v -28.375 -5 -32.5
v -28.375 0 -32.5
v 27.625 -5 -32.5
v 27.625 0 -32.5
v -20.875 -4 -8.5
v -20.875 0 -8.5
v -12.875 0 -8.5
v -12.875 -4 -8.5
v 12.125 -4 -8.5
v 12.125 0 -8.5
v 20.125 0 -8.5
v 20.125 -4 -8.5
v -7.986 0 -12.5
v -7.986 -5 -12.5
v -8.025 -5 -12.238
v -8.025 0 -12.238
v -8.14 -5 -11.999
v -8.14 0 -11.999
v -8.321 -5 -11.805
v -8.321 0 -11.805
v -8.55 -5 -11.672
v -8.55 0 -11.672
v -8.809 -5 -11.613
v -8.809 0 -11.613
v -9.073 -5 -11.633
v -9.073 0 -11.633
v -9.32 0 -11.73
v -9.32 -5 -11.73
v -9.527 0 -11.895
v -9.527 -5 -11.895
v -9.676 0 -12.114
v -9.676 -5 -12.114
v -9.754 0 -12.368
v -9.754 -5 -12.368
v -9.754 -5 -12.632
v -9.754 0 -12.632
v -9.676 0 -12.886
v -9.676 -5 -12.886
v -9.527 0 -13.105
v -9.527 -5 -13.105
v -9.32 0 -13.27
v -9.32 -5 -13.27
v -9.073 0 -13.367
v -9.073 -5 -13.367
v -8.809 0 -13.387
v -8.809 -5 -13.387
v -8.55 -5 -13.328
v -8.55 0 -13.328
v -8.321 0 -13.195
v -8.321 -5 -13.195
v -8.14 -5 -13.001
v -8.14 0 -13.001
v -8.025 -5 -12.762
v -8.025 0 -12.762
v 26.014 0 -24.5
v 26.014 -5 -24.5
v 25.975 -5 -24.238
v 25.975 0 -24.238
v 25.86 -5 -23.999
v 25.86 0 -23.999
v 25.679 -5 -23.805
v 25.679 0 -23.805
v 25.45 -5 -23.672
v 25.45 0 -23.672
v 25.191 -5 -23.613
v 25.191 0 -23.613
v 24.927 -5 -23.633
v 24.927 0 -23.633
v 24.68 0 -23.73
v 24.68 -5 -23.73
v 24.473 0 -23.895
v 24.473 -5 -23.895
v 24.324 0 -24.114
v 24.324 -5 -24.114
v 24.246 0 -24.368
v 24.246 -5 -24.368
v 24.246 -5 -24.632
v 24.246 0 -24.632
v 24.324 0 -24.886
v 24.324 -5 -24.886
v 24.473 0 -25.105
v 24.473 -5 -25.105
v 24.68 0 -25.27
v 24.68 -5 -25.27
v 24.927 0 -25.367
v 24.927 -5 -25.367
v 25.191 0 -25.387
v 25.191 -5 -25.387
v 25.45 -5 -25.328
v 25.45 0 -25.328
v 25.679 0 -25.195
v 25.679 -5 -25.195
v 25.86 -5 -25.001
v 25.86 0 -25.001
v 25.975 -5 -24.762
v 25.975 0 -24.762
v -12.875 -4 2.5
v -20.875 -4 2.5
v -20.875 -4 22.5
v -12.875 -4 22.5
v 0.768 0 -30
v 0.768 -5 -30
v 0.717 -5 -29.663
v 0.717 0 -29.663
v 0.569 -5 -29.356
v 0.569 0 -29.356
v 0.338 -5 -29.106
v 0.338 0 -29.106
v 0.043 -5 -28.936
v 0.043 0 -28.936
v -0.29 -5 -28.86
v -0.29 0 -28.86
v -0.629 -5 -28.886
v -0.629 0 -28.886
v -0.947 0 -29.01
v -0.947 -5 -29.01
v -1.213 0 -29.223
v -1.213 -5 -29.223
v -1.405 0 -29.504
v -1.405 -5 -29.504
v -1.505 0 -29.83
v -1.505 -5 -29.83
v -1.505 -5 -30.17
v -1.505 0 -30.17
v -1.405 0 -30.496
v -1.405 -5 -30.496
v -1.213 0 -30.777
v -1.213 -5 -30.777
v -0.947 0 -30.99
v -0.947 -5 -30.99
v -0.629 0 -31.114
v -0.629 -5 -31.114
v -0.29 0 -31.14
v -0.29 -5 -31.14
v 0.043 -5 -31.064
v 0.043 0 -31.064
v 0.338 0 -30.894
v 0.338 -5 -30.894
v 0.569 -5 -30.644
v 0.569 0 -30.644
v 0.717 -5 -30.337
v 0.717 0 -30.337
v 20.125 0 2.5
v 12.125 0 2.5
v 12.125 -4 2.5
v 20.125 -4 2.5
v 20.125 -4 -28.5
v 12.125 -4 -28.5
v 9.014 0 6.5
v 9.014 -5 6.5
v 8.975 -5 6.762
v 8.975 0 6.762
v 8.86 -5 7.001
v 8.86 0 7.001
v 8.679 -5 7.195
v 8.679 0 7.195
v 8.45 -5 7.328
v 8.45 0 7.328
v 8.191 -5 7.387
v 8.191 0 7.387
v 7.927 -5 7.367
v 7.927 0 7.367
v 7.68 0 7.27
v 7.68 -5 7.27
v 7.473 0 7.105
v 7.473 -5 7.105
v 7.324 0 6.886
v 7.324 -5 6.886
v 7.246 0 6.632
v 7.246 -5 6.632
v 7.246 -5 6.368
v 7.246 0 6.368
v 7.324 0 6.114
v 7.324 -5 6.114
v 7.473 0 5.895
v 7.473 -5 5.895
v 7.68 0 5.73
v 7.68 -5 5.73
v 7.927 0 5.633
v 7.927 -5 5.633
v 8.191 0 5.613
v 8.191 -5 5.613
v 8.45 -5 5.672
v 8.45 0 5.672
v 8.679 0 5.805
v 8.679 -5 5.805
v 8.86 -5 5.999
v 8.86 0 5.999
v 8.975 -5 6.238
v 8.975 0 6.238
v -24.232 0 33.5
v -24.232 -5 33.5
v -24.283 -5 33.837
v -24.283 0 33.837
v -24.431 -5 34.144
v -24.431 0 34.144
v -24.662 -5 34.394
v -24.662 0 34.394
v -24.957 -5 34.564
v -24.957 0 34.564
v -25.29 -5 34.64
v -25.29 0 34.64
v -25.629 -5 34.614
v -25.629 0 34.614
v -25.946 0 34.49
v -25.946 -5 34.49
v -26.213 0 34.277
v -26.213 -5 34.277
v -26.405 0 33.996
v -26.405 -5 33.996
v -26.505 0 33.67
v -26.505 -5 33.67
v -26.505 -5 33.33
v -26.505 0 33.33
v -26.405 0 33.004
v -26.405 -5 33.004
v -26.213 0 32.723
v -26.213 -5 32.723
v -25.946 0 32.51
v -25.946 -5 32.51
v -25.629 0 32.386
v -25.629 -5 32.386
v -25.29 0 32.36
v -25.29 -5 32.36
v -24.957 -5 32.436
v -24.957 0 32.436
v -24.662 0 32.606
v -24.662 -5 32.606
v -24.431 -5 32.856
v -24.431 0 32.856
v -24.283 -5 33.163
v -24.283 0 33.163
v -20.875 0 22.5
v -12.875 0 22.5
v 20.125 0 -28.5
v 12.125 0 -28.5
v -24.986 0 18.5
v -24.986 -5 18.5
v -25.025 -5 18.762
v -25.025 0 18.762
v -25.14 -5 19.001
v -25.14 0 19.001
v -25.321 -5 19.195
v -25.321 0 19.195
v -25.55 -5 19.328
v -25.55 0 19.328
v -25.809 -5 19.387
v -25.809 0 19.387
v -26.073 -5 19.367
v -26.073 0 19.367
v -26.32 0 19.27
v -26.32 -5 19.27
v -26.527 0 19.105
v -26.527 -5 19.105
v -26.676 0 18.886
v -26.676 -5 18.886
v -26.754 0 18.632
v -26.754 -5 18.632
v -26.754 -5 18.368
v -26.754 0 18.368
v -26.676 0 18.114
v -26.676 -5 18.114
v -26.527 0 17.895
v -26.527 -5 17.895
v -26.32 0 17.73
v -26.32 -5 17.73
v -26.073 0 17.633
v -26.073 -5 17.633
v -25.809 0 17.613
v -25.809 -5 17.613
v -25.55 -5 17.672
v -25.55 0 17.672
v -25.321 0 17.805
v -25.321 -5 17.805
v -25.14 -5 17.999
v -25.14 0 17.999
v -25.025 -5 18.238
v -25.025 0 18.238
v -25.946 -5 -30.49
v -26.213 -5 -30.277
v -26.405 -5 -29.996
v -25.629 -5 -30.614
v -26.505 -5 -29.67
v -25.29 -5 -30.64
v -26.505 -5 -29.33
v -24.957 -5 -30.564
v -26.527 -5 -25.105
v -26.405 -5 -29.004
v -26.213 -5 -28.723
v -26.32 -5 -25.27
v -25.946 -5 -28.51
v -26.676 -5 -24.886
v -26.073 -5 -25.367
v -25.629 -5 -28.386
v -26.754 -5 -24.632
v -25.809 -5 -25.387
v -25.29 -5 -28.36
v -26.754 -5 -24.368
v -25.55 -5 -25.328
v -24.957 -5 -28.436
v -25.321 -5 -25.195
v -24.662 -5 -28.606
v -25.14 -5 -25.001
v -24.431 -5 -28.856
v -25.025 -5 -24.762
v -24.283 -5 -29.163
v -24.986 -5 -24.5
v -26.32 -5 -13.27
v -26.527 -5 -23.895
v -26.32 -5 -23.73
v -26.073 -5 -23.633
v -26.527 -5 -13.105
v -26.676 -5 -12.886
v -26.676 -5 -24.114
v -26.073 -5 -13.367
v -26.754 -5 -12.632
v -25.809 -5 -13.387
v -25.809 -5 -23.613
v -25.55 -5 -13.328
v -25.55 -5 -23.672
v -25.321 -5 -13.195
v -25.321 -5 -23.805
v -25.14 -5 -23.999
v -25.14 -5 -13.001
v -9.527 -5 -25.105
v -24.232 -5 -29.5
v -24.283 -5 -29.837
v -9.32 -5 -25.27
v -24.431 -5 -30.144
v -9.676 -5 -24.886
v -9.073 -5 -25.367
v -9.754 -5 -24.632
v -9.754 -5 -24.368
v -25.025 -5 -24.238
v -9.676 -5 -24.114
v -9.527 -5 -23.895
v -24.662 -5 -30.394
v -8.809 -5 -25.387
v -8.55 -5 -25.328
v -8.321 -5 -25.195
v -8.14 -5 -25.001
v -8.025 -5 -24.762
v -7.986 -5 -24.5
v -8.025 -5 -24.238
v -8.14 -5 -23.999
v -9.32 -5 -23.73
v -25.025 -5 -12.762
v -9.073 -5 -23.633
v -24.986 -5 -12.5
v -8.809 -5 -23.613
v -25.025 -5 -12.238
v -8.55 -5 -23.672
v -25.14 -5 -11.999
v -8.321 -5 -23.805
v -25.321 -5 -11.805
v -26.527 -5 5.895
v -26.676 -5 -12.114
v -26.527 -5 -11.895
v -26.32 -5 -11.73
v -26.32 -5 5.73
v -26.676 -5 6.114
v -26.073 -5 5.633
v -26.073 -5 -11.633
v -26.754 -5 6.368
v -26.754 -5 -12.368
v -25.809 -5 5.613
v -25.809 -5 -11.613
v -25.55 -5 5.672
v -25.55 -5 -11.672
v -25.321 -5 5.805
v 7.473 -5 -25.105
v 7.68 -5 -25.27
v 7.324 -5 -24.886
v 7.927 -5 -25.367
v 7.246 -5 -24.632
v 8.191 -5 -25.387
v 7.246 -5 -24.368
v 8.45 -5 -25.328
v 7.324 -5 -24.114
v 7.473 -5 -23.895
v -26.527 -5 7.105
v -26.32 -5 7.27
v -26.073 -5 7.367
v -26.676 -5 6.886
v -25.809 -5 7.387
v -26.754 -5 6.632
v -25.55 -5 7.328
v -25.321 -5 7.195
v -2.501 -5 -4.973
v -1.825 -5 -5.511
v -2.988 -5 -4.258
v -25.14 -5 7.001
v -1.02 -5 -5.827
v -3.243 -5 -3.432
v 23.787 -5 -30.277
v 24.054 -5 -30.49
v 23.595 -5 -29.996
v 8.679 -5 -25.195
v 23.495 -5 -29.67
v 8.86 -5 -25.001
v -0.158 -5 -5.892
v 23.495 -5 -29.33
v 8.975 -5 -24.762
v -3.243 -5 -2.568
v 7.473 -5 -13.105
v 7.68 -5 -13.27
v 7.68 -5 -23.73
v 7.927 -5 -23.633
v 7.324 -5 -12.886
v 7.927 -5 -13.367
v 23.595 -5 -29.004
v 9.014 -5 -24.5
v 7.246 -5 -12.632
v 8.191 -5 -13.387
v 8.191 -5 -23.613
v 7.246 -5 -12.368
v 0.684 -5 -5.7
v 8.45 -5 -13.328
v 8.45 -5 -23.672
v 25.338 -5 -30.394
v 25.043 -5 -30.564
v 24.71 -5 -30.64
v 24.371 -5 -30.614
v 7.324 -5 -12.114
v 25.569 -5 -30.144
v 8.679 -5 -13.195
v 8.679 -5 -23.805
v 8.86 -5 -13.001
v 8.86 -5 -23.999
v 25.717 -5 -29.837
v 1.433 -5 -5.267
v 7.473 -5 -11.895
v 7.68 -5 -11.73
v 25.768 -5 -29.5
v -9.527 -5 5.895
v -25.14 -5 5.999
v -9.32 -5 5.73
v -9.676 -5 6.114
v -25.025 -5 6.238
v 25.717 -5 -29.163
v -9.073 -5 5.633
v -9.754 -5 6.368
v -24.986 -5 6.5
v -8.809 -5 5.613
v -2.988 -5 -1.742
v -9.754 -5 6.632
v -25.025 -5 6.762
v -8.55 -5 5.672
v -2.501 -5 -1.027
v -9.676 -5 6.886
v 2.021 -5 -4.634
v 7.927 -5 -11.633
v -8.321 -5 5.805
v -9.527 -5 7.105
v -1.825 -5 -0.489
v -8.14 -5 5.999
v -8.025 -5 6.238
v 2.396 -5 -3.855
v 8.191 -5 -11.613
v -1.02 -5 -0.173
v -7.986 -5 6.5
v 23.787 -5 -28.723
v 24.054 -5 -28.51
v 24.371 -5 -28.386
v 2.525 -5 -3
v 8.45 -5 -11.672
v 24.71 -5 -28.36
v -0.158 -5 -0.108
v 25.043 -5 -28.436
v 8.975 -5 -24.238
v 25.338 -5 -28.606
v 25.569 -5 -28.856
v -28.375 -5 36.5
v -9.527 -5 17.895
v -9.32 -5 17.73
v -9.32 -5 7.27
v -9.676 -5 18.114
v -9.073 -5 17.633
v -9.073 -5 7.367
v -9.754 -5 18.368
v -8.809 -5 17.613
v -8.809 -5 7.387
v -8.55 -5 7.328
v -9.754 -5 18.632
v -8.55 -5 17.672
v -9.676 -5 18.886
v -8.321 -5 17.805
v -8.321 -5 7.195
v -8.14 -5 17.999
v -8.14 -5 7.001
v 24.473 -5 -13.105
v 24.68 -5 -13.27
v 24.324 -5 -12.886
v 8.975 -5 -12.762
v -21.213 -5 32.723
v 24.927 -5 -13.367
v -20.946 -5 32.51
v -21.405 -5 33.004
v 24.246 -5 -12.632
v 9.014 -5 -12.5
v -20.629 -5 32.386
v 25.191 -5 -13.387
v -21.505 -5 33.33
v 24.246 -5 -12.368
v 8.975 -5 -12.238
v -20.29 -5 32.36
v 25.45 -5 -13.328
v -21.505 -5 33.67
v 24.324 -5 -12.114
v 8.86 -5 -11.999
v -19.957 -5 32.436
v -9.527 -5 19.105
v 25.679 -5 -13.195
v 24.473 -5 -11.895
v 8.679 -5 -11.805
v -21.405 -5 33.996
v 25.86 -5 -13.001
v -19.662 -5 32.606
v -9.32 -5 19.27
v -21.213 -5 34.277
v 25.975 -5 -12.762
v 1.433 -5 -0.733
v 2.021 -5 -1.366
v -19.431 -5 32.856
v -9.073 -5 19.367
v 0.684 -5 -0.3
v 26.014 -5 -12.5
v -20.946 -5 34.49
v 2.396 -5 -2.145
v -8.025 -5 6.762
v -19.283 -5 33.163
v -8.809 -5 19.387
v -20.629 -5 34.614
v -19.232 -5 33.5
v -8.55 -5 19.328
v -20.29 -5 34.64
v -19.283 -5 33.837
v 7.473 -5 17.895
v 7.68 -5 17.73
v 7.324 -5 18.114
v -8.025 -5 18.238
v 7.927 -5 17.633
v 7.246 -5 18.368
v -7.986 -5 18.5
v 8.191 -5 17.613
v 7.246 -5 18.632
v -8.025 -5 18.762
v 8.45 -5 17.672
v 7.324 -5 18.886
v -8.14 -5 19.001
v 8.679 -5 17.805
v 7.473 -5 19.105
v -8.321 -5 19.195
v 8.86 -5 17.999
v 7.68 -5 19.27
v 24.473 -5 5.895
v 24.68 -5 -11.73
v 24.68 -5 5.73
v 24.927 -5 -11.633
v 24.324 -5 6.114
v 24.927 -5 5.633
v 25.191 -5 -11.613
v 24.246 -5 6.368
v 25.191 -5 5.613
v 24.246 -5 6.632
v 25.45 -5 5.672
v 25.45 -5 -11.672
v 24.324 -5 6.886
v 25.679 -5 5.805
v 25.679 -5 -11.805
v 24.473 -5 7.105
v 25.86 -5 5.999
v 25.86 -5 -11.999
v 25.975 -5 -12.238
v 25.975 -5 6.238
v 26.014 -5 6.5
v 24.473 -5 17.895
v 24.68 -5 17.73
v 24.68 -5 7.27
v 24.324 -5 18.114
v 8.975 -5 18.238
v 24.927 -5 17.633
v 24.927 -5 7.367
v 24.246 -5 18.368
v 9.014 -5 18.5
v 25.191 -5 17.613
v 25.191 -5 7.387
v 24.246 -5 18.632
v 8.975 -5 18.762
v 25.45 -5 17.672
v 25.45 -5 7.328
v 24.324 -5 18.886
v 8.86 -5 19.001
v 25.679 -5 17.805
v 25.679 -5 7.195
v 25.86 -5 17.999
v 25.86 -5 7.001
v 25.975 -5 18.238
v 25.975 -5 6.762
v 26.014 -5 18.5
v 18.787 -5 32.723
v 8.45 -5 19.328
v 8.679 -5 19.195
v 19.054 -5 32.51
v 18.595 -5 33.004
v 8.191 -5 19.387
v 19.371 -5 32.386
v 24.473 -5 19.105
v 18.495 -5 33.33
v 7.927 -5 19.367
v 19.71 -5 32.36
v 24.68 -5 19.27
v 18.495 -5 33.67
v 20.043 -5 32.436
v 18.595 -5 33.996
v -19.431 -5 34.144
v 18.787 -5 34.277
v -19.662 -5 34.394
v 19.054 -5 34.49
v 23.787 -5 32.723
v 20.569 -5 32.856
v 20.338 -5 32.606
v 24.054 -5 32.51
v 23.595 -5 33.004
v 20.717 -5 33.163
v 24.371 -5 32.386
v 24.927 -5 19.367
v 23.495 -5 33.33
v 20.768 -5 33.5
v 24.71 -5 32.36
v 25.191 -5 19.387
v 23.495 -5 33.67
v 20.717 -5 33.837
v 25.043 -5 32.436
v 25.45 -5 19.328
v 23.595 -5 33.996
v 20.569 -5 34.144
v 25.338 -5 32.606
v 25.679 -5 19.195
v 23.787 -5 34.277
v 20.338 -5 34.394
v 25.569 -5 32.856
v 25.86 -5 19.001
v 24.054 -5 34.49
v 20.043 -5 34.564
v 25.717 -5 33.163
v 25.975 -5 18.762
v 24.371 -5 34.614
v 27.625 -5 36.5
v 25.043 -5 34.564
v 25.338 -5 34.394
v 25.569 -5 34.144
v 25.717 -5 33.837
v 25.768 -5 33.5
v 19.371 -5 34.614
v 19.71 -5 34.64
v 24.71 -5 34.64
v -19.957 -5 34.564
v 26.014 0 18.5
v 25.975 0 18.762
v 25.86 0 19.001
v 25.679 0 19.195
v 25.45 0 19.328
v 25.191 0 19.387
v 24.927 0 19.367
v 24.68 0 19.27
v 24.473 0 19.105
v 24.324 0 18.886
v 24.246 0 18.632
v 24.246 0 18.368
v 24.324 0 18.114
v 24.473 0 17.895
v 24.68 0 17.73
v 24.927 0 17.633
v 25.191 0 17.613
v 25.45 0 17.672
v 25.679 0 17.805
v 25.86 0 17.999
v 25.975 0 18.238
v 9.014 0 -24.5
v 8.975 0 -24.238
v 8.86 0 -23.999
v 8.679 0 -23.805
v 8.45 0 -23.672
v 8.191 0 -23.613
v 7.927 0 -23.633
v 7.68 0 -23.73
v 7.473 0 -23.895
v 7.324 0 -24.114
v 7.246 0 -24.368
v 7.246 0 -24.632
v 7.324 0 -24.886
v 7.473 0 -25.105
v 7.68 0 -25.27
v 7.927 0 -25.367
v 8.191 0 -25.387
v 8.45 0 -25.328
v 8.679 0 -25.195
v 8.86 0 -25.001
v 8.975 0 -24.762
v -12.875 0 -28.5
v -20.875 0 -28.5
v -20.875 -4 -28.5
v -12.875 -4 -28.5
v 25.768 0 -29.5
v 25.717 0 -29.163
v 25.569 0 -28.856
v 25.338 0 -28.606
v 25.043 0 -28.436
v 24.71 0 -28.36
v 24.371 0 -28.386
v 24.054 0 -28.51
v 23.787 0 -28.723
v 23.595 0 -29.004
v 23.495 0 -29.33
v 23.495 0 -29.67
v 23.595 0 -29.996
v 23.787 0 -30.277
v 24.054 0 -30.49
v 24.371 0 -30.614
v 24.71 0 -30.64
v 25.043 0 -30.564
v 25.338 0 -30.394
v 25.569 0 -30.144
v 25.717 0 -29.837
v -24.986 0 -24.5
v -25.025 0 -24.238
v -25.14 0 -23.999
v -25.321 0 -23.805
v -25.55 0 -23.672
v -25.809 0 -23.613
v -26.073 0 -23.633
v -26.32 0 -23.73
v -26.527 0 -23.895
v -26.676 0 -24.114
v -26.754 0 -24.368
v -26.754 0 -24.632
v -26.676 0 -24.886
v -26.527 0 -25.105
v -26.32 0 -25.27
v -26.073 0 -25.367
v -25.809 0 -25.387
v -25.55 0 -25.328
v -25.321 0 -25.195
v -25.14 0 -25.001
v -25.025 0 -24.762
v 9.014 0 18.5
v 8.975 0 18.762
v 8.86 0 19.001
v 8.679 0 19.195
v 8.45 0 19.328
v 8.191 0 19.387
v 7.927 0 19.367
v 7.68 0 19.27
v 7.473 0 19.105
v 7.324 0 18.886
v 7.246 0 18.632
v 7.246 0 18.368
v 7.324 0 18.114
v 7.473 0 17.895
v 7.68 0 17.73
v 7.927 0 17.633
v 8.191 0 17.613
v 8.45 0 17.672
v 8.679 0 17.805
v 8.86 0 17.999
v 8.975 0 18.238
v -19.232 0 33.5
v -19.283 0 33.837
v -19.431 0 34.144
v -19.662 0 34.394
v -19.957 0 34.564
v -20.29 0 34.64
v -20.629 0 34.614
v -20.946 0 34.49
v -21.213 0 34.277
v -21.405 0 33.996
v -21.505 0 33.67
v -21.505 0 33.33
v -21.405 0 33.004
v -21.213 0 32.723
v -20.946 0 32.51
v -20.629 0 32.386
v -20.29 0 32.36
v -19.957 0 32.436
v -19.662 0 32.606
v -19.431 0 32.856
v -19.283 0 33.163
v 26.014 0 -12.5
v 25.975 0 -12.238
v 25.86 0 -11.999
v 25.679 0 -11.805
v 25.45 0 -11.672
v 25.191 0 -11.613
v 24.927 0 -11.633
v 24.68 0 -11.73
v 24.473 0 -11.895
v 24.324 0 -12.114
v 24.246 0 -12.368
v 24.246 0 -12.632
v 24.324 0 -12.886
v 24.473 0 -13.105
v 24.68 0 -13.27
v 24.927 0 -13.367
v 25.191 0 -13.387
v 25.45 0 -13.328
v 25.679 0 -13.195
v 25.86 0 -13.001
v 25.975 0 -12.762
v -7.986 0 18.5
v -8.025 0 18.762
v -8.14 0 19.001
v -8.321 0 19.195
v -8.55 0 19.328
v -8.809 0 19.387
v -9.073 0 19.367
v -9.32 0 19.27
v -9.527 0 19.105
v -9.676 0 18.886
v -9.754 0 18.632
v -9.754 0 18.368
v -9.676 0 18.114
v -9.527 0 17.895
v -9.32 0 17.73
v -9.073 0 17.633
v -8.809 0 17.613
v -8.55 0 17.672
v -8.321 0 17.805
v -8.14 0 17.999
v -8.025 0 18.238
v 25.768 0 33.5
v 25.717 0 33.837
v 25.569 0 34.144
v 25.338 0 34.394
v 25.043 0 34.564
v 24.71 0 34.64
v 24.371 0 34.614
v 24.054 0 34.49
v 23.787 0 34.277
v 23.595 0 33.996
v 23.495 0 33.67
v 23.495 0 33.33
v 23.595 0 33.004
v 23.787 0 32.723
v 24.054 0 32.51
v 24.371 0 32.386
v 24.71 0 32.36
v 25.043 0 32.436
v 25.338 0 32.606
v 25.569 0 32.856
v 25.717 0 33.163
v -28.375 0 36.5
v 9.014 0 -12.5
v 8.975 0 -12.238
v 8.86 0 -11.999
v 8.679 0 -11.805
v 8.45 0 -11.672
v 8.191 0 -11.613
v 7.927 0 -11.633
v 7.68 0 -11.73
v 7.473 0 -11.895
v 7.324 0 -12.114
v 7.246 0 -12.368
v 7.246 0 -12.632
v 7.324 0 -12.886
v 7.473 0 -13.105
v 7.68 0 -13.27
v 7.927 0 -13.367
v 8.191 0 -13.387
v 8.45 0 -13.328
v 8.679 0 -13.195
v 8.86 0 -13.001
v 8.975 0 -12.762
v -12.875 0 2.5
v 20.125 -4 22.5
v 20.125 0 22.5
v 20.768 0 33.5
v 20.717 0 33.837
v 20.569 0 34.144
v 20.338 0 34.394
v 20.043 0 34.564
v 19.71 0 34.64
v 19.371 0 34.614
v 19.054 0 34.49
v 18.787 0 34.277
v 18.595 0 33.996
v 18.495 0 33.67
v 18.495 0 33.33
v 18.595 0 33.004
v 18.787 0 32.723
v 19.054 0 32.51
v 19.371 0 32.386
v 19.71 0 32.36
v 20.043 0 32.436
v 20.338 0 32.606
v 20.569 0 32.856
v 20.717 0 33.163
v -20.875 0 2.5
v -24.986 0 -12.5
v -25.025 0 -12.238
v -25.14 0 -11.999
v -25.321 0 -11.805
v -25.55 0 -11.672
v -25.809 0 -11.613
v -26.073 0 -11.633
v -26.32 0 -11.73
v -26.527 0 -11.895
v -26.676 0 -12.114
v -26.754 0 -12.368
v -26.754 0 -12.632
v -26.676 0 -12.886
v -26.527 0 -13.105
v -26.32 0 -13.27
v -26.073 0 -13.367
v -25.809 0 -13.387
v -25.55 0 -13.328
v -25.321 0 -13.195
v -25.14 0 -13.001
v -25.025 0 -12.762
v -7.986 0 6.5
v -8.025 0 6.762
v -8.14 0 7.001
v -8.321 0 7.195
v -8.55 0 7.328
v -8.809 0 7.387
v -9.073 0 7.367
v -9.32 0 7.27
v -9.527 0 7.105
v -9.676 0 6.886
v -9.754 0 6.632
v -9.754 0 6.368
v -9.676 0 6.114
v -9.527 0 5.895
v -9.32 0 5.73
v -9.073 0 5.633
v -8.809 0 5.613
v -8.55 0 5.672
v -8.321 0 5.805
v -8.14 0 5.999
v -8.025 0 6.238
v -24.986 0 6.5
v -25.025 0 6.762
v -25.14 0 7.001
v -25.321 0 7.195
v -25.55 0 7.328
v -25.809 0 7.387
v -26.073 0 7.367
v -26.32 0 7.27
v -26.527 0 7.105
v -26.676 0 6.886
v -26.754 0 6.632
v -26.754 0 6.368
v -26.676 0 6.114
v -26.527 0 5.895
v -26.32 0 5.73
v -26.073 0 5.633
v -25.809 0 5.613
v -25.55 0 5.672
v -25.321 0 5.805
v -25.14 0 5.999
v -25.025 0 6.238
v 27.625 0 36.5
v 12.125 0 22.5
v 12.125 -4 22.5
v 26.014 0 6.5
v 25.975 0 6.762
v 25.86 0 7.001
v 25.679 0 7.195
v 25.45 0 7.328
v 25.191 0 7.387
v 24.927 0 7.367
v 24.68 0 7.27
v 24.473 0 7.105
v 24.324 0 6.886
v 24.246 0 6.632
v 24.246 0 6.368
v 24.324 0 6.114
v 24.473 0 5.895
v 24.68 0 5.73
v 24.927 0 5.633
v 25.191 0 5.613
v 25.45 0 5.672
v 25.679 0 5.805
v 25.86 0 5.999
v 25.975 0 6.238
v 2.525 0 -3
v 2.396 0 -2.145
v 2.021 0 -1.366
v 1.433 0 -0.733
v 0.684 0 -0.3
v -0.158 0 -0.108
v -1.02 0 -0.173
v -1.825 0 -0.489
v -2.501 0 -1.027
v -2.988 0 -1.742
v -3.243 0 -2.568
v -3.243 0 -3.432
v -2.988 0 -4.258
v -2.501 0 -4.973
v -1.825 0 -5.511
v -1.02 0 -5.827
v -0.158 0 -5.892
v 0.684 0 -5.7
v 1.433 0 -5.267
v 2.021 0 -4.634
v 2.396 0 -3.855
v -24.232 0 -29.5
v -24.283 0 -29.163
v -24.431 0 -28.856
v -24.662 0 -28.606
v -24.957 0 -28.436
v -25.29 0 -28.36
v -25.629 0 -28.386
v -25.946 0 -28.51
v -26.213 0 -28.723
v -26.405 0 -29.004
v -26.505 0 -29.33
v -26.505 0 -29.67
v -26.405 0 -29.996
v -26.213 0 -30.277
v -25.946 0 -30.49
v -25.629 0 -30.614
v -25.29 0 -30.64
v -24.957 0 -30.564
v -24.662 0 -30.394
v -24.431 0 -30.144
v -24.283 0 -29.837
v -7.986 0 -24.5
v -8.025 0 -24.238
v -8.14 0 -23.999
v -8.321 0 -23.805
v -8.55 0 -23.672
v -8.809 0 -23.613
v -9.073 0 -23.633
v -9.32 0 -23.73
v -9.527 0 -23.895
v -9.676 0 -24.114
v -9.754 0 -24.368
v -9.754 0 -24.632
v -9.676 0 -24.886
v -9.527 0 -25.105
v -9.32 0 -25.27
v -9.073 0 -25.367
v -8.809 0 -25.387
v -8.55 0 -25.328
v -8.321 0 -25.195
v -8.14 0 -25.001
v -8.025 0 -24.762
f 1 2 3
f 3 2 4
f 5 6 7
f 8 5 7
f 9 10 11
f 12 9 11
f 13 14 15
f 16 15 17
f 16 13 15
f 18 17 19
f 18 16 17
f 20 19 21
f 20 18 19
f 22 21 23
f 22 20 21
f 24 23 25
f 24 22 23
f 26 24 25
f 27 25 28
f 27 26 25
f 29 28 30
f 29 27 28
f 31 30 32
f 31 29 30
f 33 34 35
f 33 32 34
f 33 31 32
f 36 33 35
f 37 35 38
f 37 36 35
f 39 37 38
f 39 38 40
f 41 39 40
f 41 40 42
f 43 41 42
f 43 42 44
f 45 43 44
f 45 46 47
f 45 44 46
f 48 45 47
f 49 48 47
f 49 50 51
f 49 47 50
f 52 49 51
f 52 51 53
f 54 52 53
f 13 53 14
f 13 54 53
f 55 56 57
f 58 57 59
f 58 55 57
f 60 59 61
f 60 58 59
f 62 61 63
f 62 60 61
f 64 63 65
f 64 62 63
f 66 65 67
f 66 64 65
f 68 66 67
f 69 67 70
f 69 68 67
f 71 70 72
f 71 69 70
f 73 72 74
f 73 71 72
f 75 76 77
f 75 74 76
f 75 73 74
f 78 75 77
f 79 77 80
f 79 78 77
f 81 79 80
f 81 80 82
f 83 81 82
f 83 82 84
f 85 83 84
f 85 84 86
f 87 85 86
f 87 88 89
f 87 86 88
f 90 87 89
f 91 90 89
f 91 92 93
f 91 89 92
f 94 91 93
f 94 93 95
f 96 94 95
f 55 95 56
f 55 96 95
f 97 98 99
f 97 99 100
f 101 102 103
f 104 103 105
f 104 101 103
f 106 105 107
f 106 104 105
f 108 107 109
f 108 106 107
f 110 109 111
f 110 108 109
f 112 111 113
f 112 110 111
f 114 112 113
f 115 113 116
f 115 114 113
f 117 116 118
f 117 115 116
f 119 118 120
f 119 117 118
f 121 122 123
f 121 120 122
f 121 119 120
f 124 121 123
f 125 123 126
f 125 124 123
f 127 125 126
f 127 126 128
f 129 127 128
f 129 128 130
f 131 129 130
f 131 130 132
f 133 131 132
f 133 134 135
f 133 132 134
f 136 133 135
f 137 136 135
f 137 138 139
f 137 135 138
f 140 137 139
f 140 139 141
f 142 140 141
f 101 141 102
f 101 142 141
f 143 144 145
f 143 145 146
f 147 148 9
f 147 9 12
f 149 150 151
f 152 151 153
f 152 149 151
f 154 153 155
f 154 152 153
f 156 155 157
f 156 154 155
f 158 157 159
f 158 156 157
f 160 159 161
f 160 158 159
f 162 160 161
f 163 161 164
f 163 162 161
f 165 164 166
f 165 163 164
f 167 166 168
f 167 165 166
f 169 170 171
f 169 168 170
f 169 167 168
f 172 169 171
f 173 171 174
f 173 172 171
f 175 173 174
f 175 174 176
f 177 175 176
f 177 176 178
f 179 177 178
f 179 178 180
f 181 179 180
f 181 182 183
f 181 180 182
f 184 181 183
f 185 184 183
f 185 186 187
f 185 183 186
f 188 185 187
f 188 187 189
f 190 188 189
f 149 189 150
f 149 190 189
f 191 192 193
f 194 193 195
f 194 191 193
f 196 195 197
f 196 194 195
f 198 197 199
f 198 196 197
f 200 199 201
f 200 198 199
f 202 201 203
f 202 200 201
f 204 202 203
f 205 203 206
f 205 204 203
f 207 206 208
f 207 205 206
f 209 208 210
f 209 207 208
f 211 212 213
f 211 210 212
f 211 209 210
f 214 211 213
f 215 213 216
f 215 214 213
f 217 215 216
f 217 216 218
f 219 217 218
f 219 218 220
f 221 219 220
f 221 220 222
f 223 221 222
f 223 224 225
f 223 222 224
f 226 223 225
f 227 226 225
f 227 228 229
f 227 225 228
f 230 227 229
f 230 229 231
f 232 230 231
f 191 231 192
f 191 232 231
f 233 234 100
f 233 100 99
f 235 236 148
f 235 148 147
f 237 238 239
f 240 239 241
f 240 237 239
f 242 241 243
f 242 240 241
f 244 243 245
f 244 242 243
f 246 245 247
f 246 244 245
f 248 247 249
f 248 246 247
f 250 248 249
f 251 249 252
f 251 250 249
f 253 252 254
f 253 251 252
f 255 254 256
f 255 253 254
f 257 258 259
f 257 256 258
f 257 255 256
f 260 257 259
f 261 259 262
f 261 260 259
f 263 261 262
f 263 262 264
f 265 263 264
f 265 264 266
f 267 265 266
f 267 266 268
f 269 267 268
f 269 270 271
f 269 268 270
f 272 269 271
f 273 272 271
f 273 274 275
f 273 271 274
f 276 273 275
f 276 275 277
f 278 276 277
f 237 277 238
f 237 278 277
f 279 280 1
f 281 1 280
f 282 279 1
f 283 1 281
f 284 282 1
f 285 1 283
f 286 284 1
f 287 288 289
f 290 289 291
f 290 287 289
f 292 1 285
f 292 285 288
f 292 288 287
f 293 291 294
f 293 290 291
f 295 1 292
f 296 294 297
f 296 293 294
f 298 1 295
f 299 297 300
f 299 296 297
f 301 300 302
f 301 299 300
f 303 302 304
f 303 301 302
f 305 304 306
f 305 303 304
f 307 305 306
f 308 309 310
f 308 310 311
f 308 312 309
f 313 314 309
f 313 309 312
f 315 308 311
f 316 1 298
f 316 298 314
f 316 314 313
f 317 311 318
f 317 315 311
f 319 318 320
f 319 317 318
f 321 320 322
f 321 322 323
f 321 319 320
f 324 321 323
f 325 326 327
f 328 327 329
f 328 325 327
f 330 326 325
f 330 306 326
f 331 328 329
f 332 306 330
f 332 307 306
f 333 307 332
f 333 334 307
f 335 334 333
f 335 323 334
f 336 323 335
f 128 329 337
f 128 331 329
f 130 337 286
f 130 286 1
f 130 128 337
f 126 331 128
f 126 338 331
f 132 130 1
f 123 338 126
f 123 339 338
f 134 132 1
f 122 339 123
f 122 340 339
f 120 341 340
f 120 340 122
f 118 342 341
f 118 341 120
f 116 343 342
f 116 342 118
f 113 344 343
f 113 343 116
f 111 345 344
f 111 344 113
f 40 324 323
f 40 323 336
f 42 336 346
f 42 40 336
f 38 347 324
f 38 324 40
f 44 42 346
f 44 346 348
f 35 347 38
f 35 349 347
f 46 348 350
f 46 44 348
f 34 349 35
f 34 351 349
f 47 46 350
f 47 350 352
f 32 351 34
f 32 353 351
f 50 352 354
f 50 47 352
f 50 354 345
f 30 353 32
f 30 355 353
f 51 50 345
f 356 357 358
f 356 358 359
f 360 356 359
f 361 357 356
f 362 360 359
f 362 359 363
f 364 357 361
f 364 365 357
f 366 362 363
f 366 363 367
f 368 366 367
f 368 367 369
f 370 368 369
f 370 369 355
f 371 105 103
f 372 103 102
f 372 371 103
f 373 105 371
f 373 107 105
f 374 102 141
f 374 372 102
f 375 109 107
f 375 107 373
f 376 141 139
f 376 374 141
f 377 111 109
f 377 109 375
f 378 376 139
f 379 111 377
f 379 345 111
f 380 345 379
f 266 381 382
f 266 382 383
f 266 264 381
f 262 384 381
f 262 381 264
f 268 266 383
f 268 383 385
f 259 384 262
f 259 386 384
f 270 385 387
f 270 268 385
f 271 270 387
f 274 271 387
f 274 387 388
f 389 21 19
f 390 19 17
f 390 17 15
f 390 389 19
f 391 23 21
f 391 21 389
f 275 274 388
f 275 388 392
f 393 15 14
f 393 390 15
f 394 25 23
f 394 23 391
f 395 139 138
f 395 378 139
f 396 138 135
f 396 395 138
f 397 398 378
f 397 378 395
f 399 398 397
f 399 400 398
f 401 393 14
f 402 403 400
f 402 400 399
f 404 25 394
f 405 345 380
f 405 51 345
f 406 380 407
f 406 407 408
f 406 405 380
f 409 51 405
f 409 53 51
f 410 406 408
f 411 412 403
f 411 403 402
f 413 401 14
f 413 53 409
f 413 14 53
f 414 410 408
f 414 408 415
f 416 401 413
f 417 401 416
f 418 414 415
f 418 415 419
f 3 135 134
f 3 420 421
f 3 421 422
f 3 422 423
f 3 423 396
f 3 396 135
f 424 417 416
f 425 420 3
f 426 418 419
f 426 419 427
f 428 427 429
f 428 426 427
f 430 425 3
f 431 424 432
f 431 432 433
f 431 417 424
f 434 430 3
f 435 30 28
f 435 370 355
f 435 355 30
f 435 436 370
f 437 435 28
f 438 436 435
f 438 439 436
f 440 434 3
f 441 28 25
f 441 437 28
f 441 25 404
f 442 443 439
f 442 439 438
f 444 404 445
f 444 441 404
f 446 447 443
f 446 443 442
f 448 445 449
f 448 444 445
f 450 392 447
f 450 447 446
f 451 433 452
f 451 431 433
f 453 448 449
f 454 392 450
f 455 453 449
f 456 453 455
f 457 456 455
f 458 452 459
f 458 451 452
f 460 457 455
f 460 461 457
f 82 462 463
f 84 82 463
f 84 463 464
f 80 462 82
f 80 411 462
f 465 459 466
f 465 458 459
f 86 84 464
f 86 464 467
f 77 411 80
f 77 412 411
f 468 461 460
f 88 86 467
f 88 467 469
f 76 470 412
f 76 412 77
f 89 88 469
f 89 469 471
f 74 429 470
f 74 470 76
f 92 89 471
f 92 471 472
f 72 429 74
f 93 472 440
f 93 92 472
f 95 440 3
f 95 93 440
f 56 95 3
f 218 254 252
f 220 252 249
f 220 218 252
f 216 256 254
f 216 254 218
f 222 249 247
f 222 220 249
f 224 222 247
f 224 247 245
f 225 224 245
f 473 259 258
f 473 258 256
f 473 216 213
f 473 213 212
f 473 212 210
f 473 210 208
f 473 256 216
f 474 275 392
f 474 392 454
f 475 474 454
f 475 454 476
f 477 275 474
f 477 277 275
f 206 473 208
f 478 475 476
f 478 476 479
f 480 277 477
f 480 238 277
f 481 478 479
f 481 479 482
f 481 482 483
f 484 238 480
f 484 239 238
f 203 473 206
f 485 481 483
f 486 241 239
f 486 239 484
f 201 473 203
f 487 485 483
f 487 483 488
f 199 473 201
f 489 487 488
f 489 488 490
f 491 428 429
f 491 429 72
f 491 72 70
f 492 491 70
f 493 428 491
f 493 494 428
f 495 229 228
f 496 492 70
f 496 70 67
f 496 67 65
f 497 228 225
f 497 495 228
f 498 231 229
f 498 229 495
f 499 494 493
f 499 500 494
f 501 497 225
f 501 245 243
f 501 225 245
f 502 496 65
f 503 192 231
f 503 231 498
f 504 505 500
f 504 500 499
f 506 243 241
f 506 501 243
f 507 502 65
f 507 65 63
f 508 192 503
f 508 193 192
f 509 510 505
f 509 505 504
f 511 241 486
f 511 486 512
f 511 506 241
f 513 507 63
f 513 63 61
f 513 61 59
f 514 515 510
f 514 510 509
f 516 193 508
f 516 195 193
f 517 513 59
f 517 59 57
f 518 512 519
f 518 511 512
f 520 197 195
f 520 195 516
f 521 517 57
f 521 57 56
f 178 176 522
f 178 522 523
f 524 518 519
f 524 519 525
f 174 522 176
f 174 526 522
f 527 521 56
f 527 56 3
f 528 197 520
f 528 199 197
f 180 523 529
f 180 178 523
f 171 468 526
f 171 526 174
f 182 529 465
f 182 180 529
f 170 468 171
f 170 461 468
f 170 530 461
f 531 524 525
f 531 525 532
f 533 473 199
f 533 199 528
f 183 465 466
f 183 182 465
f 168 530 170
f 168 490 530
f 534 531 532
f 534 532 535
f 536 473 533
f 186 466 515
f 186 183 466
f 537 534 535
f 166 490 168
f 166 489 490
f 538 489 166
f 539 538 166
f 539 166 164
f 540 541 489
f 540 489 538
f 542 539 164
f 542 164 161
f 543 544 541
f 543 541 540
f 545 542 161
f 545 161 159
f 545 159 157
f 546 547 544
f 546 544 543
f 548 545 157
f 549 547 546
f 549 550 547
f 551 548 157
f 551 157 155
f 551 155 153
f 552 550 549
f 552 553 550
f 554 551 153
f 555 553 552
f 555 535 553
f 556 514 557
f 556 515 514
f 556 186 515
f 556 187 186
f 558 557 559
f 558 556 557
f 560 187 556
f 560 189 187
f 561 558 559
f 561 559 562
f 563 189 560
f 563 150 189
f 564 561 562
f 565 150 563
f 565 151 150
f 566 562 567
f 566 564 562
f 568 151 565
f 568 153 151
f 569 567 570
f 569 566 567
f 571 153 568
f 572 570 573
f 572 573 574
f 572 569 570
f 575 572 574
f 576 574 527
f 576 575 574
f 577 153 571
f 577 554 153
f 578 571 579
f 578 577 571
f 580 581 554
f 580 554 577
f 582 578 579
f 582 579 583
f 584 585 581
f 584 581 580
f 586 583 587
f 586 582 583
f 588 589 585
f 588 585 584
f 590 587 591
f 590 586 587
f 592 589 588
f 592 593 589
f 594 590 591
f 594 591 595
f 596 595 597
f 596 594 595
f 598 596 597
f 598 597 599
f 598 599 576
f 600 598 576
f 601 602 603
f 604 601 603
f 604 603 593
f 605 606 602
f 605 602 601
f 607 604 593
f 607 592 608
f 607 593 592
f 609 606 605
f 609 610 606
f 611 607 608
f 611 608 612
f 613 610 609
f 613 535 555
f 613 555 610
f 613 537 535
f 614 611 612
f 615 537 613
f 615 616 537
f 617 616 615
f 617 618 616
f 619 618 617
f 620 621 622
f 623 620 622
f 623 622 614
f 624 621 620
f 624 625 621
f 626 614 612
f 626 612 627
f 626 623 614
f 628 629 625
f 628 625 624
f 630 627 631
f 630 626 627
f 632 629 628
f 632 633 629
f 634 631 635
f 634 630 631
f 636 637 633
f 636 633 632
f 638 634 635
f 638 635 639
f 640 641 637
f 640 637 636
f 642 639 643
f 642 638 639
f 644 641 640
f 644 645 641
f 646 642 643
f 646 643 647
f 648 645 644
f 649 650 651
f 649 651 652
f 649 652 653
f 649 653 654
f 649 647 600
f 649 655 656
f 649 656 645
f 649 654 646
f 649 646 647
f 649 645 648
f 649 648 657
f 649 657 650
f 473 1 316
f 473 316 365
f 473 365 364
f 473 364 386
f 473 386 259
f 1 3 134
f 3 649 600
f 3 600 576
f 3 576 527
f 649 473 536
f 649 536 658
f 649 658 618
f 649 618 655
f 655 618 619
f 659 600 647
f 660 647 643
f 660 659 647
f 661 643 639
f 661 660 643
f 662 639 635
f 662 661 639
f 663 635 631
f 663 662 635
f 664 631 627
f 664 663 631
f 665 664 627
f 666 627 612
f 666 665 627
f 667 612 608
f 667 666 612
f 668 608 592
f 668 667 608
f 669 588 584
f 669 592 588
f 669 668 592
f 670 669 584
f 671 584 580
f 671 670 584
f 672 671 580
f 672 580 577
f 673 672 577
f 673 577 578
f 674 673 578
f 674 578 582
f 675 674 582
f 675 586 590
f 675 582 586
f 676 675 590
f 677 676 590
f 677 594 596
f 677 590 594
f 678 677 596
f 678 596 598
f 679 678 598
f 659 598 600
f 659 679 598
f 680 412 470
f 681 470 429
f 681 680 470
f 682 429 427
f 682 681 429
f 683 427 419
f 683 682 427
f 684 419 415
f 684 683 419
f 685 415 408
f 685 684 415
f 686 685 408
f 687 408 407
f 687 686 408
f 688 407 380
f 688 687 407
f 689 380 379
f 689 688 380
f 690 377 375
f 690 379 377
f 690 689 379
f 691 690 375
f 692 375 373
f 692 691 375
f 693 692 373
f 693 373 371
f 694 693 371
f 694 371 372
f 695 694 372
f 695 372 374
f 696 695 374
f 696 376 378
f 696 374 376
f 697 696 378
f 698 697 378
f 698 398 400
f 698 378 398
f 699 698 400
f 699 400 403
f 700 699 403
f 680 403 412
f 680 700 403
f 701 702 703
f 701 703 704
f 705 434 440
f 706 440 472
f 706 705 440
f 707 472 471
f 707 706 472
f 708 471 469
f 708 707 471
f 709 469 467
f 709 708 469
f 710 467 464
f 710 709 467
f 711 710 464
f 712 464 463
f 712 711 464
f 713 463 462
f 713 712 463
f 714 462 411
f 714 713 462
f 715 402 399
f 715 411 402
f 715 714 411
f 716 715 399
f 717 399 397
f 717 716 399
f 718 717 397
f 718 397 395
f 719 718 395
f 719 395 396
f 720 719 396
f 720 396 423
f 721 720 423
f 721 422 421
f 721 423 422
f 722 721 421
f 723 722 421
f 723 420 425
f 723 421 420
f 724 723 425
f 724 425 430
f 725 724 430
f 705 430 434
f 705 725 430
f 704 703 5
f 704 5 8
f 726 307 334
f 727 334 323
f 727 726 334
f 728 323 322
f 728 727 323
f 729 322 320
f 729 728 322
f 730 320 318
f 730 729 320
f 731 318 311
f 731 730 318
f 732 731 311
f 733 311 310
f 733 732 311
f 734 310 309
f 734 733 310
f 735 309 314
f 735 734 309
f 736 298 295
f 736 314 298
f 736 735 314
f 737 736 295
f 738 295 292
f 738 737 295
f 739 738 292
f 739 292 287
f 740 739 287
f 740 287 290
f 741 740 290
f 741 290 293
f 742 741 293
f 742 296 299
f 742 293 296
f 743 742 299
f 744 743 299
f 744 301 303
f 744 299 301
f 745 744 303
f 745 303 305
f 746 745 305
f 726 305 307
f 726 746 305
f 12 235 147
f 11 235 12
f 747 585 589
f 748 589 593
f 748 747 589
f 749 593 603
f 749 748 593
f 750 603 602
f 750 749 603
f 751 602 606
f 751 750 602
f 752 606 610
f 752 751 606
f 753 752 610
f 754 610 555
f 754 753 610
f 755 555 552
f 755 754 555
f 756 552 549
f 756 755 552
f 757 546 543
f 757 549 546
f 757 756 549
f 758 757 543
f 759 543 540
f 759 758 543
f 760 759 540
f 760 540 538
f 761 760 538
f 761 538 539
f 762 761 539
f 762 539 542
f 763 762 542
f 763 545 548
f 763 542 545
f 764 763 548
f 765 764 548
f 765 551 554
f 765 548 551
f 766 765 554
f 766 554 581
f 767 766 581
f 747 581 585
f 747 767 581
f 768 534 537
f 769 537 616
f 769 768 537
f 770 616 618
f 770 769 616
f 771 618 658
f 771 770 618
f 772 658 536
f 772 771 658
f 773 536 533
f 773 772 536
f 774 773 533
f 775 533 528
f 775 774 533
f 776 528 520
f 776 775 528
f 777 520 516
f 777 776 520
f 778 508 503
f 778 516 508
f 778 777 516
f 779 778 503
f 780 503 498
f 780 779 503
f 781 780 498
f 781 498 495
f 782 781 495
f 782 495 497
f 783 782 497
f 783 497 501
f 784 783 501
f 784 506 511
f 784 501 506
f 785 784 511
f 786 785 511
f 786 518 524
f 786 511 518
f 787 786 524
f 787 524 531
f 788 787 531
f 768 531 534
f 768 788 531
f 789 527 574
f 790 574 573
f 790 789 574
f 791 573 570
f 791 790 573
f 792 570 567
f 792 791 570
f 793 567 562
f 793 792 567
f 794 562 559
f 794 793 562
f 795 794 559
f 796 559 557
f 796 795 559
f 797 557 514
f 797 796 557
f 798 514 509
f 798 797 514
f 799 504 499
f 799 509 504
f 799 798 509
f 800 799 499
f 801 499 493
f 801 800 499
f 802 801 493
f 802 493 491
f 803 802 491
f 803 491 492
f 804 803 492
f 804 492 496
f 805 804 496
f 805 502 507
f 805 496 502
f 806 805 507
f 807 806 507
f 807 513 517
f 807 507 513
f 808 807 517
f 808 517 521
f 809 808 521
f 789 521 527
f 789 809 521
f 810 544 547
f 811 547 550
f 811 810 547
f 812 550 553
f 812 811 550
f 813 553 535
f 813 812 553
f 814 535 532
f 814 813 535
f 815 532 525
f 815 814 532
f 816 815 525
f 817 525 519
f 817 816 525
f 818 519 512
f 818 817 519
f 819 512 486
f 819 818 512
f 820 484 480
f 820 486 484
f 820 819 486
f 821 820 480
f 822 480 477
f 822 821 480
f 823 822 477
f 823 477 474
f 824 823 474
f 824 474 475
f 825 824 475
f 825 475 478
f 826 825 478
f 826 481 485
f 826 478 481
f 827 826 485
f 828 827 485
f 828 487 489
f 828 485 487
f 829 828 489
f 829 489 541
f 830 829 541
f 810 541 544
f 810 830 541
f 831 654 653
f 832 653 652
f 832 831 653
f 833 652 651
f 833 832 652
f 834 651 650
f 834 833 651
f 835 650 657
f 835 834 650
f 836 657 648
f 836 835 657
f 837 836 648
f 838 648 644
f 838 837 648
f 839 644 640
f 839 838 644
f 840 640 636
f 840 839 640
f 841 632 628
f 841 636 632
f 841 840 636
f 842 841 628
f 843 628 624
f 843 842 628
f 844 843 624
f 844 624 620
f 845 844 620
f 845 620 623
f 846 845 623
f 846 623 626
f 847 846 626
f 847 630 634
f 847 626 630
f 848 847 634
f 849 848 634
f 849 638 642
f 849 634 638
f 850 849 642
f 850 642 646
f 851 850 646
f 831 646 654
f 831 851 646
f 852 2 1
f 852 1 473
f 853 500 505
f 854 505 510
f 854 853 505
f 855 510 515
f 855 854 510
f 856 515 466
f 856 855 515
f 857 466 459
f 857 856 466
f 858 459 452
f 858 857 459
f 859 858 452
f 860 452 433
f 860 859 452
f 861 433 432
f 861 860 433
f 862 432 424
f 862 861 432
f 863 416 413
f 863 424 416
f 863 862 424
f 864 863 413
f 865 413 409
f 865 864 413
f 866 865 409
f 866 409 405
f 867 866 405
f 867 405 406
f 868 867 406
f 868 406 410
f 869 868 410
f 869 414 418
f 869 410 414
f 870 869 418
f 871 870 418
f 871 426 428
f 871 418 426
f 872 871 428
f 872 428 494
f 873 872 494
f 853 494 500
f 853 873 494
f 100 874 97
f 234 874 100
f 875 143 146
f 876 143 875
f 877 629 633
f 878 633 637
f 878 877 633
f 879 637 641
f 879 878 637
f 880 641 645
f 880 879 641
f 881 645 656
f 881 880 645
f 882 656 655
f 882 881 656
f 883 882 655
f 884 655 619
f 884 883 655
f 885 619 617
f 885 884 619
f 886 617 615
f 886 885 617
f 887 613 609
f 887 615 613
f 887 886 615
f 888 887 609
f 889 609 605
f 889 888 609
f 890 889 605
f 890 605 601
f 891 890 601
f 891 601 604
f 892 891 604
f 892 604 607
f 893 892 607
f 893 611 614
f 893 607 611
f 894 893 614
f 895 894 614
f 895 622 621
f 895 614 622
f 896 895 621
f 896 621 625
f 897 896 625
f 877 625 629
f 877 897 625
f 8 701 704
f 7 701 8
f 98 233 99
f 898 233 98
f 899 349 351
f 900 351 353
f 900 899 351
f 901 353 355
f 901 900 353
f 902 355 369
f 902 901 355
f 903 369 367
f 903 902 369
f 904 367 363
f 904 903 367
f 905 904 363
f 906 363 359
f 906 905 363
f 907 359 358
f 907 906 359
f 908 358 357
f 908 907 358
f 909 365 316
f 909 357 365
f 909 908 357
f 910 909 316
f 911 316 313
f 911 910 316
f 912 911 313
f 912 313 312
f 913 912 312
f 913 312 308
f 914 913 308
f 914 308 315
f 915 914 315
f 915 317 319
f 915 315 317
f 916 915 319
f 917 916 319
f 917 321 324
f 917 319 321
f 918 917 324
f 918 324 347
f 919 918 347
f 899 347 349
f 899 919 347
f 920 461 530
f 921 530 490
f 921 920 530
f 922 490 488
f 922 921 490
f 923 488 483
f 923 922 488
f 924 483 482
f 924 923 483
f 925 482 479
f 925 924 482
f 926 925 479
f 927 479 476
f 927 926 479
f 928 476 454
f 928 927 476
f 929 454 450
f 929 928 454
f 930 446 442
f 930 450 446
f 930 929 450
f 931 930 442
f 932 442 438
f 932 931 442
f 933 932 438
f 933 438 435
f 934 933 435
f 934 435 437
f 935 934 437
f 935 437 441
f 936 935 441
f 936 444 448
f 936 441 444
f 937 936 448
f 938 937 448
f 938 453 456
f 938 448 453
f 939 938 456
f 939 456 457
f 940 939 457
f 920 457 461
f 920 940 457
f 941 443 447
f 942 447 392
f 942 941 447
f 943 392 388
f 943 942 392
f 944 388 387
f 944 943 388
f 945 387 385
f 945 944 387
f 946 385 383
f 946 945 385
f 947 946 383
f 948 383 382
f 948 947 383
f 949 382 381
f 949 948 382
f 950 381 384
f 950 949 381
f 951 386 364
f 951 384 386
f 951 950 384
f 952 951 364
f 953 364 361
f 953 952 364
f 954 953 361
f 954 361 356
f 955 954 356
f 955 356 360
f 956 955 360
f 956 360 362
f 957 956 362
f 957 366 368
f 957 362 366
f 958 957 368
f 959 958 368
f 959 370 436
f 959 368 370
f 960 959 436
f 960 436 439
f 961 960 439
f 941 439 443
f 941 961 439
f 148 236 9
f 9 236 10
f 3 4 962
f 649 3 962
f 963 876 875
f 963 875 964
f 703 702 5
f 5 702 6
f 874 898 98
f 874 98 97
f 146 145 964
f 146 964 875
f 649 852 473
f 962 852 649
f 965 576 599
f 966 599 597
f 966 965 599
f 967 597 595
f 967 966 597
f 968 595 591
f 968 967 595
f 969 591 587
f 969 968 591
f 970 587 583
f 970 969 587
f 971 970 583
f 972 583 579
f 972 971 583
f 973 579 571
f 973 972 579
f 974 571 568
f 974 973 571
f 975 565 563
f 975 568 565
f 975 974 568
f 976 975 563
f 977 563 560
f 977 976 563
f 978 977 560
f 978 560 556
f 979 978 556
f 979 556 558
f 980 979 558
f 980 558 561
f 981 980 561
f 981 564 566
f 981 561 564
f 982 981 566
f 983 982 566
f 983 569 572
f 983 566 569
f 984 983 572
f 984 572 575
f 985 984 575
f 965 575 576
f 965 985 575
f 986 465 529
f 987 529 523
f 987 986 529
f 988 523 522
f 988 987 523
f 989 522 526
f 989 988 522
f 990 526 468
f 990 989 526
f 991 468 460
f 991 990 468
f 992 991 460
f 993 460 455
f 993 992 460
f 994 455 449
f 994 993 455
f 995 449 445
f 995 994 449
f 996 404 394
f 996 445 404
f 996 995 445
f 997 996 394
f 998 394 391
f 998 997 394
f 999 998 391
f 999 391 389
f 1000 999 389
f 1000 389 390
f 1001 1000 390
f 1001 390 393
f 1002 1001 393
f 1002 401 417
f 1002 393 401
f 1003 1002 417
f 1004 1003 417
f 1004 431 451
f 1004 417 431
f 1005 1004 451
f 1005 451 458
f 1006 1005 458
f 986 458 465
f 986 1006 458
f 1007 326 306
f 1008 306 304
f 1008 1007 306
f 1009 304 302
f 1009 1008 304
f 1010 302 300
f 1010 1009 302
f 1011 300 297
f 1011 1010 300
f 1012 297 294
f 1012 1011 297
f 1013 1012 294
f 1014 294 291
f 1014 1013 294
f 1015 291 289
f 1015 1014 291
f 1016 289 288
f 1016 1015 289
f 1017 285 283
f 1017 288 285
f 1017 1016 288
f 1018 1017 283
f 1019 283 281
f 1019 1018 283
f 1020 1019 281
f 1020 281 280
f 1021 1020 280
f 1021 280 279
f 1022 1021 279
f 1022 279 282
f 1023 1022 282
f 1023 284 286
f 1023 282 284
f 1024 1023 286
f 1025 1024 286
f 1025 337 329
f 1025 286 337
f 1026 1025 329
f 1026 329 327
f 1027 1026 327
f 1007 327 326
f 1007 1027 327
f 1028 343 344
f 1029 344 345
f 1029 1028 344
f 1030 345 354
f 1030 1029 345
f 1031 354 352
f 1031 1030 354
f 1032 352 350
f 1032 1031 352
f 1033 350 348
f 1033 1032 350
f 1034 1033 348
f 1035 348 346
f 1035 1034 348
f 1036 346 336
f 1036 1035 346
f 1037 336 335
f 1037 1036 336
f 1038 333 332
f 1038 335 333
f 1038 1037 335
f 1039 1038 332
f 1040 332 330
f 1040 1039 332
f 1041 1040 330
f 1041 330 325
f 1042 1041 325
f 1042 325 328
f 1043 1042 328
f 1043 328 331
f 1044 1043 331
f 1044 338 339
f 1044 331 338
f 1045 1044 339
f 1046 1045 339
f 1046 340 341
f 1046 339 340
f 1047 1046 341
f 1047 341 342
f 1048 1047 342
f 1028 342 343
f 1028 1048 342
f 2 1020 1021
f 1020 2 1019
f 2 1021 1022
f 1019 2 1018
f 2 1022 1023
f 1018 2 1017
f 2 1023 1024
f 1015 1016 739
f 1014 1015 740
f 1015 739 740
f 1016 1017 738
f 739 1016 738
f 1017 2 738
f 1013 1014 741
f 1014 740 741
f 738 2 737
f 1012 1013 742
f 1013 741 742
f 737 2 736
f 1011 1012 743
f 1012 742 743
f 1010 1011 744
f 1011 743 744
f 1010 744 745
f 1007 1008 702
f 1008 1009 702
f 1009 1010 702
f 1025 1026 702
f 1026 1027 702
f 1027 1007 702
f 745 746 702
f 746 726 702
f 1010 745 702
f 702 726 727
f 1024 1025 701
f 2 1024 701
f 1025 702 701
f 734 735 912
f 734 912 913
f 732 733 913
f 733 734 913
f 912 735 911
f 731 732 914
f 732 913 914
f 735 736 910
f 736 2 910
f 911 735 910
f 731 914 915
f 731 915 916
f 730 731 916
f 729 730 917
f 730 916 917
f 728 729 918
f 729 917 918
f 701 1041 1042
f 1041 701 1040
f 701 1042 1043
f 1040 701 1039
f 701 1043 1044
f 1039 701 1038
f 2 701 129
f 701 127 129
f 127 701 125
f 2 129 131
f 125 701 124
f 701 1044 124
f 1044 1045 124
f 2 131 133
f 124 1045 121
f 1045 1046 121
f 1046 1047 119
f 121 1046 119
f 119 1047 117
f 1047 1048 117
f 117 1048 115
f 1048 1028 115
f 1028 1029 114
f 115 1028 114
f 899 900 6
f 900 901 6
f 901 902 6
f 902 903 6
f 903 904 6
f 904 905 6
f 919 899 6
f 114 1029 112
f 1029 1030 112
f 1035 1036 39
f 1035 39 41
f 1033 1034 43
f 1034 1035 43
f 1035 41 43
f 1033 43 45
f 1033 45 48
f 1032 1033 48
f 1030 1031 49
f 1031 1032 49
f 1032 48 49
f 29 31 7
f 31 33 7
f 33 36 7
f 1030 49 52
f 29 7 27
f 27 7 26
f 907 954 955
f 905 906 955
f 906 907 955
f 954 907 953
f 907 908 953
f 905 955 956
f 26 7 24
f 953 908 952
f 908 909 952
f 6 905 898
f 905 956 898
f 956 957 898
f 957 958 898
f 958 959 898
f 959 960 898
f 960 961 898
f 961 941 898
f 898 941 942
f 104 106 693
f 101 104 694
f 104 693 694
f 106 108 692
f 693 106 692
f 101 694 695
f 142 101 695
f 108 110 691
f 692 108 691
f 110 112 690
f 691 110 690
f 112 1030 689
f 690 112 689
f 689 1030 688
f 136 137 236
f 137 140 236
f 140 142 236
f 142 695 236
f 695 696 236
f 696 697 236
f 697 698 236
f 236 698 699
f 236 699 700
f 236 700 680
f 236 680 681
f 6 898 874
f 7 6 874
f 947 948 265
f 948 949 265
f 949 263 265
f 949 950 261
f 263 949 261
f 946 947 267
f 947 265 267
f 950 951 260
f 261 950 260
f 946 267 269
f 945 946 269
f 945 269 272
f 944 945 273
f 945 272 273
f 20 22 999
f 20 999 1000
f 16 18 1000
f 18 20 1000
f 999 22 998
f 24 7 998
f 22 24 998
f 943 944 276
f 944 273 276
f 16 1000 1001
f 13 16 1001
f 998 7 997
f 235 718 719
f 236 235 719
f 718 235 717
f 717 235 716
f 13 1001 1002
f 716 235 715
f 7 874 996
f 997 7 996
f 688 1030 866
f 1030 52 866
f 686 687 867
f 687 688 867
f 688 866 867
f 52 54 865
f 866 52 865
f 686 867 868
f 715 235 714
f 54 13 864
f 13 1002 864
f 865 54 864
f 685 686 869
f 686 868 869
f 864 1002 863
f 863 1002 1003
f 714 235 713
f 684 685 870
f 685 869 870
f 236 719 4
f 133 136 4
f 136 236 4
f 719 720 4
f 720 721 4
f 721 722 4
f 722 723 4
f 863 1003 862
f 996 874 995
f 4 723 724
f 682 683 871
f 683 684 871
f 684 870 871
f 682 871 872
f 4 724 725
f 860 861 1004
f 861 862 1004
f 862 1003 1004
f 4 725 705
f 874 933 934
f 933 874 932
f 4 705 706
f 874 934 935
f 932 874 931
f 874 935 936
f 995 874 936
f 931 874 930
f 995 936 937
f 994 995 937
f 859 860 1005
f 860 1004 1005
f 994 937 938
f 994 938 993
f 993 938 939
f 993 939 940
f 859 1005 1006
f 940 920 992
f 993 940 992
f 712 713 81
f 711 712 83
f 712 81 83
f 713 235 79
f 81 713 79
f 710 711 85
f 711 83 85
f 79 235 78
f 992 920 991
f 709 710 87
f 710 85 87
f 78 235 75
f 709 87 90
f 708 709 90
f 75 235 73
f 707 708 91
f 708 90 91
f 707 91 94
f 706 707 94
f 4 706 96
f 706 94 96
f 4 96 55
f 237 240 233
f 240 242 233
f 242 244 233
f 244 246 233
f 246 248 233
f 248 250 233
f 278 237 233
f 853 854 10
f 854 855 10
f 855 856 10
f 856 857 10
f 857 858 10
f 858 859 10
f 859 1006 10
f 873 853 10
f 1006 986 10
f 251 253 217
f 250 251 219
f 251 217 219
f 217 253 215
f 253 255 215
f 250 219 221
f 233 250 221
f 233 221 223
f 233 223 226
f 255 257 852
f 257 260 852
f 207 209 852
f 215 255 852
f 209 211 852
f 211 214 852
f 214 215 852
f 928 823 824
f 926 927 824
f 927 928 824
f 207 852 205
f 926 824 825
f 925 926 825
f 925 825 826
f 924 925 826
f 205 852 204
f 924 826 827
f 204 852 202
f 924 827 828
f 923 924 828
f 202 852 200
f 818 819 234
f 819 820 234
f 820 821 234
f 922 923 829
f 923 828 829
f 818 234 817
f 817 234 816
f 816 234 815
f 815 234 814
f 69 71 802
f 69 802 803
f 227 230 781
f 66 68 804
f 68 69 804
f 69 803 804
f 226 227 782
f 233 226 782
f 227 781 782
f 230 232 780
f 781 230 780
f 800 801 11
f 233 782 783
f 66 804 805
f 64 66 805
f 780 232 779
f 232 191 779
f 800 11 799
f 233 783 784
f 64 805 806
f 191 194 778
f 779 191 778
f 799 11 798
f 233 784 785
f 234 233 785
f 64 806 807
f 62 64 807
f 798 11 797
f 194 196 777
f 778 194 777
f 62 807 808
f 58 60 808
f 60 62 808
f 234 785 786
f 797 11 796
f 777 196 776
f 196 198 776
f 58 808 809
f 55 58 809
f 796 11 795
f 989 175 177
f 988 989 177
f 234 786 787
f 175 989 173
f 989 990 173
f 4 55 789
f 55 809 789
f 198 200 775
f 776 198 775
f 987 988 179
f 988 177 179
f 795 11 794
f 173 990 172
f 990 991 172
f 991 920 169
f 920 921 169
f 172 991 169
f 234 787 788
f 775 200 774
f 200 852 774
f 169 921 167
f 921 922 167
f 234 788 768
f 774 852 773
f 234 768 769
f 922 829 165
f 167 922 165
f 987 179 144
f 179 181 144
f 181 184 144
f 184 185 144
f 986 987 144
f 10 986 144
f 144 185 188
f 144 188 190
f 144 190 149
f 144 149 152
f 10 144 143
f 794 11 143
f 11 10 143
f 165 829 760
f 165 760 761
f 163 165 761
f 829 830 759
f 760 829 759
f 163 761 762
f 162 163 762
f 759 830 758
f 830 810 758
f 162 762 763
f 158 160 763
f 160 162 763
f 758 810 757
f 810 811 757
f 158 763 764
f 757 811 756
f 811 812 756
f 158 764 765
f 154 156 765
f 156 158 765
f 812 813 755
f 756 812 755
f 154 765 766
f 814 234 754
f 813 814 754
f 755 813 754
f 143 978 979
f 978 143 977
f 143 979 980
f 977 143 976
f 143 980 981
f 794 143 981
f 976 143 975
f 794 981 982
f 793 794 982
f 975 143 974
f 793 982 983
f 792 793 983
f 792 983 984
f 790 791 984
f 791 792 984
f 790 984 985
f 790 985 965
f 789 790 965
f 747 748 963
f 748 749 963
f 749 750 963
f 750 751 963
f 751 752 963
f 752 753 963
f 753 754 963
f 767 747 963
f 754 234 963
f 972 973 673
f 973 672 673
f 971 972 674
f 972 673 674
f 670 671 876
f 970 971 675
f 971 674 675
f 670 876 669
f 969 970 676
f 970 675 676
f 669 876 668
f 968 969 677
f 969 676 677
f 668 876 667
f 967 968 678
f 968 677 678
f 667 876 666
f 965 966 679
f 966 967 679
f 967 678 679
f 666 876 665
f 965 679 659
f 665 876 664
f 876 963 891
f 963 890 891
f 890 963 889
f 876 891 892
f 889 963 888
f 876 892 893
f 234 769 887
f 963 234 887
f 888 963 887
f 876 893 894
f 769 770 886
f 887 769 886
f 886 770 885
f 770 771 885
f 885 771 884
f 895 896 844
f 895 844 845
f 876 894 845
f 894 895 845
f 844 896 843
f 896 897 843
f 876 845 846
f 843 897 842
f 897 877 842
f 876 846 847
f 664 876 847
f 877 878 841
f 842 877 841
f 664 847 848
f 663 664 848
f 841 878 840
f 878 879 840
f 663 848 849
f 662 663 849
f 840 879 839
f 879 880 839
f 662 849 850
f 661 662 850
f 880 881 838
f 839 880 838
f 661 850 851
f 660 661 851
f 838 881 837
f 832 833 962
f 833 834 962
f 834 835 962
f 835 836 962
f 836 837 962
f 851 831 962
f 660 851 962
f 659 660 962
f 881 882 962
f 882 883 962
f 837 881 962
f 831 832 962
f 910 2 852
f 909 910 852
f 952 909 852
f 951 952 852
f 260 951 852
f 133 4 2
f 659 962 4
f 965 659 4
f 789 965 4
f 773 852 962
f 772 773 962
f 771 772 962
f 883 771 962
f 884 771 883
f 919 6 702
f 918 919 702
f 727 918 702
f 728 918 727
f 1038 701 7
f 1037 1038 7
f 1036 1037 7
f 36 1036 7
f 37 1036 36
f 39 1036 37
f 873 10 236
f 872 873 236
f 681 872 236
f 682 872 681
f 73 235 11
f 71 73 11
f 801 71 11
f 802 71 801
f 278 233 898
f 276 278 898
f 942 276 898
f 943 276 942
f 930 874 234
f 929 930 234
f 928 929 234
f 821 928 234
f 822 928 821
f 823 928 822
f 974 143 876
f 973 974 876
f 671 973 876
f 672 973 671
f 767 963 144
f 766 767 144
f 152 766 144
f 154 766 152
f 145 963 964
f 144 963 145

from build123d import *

# Parameters (mm, degrees)
F1_W     = 56
F1_H     = 69
F4_DEPTH = 5
F2_W     = 8
F2_H     = 20
F5_DEPTH = 4
F3_R     = 0.889
F3_R_2   = 1.143
F3_R_3   = 2.9
F6_DEPTH = 5.001


with BuildPart() as f4:
    # F1 (on Front) → F4 (new body)
    with BuildSketch(Plane.XZ):
        with Locations((-0.375, 2)):
            Rectangle(F1_W, F1_H)
    extrude(amount=F4_DEPTH)

    # F2 (on Front) → F5 (cut)
    with BuildSketch(Plane.XZ):
        Polygon((-20.875, 12.5), (-20.875, 2.5), (-12.875, 2.5), (-12.875, 22.5), (-20.875, 22.5), align=None)
        with Locations((-16.875, -18.5)):
            Rectangle(F2_W, F2_H)
        Polygon((20.125, 12.5), (20.125, 22.5), (12.125, 22.5), (12.125, 2.5), (20.125, 2.5), align=None)
        with Locations((16.125, -18.5)):
            Rectangle(F2_W, F2_H)
    extrude(amount=F5_DEPTH, mode=Mode.SUBTRACT)

    # F3 (on Front) → F6 (cut, through all)
    with BuildSketch(Plane.XZ):
        with Locations((-25.875, 18.5)):
            Circle(F3_R)
        with Locations((-25.875, 6.5)):
            Circle(F3_R)
        with Locations((-8.875, 18.5)):
            Circle(F3_R)
        with Locations((-8.875, 6.5)):
            Circle(F3_R)
        with Locations((-8.875, -12.5)):
            Circle(F3_R)
        with Locations((-25.875, -12.5)):
            Circle(F3_R)
        with Locations((-25.875, -24.5)):
            Circle(F3_R)
        with Locations((-8.875, -24.5)):
            Circle(F3_R)
        with Locations((-0.375, -30)):
            Circle(F3_R_2)
        with Locations((-25.375, -29.5)):
            Circle(F3_R_2)
        with Locations((-0.375, -3)):
            Circle(F3_R_3)
        with Locations((-25.375, 33.5)):
            Circle(F3_R_2)
        with Locations((8.125, 18.5)):
            Circle(F3_R)
        with Locations((8.125, 6.5)):
            Circle(F3_R)
        with Locations((25.125, 18.5)):
            Circle(F3_R)
        with Locations((24.625, 33.5)):
            Circle(F3_R_2)
        with Locations((8.125, -12.5)):
            Circle(F3_R)
        with Locations((8.125, -24.5)):
            Circle(F3_R)
        with Locations((25.125, -12.5)):
            Circle(F3_R)
        with Locations((25.125, -24.5)):
            Circle(F3_R)
        with Locations((24.625, -29.5)):
            Circle(F3_R_2)
        with Locations((25.125, 6.5)):
            Circle(F3_R)
        with Locations((-20.375, 33.5)):
            Circle(F3_R_2)
        with Locations((19.625, 33.5)):
            Circle(F3_R_2)
    extrude(amount=F6_DEPTH, mode=Mode.SUBTRACT)


solid = f4.part
